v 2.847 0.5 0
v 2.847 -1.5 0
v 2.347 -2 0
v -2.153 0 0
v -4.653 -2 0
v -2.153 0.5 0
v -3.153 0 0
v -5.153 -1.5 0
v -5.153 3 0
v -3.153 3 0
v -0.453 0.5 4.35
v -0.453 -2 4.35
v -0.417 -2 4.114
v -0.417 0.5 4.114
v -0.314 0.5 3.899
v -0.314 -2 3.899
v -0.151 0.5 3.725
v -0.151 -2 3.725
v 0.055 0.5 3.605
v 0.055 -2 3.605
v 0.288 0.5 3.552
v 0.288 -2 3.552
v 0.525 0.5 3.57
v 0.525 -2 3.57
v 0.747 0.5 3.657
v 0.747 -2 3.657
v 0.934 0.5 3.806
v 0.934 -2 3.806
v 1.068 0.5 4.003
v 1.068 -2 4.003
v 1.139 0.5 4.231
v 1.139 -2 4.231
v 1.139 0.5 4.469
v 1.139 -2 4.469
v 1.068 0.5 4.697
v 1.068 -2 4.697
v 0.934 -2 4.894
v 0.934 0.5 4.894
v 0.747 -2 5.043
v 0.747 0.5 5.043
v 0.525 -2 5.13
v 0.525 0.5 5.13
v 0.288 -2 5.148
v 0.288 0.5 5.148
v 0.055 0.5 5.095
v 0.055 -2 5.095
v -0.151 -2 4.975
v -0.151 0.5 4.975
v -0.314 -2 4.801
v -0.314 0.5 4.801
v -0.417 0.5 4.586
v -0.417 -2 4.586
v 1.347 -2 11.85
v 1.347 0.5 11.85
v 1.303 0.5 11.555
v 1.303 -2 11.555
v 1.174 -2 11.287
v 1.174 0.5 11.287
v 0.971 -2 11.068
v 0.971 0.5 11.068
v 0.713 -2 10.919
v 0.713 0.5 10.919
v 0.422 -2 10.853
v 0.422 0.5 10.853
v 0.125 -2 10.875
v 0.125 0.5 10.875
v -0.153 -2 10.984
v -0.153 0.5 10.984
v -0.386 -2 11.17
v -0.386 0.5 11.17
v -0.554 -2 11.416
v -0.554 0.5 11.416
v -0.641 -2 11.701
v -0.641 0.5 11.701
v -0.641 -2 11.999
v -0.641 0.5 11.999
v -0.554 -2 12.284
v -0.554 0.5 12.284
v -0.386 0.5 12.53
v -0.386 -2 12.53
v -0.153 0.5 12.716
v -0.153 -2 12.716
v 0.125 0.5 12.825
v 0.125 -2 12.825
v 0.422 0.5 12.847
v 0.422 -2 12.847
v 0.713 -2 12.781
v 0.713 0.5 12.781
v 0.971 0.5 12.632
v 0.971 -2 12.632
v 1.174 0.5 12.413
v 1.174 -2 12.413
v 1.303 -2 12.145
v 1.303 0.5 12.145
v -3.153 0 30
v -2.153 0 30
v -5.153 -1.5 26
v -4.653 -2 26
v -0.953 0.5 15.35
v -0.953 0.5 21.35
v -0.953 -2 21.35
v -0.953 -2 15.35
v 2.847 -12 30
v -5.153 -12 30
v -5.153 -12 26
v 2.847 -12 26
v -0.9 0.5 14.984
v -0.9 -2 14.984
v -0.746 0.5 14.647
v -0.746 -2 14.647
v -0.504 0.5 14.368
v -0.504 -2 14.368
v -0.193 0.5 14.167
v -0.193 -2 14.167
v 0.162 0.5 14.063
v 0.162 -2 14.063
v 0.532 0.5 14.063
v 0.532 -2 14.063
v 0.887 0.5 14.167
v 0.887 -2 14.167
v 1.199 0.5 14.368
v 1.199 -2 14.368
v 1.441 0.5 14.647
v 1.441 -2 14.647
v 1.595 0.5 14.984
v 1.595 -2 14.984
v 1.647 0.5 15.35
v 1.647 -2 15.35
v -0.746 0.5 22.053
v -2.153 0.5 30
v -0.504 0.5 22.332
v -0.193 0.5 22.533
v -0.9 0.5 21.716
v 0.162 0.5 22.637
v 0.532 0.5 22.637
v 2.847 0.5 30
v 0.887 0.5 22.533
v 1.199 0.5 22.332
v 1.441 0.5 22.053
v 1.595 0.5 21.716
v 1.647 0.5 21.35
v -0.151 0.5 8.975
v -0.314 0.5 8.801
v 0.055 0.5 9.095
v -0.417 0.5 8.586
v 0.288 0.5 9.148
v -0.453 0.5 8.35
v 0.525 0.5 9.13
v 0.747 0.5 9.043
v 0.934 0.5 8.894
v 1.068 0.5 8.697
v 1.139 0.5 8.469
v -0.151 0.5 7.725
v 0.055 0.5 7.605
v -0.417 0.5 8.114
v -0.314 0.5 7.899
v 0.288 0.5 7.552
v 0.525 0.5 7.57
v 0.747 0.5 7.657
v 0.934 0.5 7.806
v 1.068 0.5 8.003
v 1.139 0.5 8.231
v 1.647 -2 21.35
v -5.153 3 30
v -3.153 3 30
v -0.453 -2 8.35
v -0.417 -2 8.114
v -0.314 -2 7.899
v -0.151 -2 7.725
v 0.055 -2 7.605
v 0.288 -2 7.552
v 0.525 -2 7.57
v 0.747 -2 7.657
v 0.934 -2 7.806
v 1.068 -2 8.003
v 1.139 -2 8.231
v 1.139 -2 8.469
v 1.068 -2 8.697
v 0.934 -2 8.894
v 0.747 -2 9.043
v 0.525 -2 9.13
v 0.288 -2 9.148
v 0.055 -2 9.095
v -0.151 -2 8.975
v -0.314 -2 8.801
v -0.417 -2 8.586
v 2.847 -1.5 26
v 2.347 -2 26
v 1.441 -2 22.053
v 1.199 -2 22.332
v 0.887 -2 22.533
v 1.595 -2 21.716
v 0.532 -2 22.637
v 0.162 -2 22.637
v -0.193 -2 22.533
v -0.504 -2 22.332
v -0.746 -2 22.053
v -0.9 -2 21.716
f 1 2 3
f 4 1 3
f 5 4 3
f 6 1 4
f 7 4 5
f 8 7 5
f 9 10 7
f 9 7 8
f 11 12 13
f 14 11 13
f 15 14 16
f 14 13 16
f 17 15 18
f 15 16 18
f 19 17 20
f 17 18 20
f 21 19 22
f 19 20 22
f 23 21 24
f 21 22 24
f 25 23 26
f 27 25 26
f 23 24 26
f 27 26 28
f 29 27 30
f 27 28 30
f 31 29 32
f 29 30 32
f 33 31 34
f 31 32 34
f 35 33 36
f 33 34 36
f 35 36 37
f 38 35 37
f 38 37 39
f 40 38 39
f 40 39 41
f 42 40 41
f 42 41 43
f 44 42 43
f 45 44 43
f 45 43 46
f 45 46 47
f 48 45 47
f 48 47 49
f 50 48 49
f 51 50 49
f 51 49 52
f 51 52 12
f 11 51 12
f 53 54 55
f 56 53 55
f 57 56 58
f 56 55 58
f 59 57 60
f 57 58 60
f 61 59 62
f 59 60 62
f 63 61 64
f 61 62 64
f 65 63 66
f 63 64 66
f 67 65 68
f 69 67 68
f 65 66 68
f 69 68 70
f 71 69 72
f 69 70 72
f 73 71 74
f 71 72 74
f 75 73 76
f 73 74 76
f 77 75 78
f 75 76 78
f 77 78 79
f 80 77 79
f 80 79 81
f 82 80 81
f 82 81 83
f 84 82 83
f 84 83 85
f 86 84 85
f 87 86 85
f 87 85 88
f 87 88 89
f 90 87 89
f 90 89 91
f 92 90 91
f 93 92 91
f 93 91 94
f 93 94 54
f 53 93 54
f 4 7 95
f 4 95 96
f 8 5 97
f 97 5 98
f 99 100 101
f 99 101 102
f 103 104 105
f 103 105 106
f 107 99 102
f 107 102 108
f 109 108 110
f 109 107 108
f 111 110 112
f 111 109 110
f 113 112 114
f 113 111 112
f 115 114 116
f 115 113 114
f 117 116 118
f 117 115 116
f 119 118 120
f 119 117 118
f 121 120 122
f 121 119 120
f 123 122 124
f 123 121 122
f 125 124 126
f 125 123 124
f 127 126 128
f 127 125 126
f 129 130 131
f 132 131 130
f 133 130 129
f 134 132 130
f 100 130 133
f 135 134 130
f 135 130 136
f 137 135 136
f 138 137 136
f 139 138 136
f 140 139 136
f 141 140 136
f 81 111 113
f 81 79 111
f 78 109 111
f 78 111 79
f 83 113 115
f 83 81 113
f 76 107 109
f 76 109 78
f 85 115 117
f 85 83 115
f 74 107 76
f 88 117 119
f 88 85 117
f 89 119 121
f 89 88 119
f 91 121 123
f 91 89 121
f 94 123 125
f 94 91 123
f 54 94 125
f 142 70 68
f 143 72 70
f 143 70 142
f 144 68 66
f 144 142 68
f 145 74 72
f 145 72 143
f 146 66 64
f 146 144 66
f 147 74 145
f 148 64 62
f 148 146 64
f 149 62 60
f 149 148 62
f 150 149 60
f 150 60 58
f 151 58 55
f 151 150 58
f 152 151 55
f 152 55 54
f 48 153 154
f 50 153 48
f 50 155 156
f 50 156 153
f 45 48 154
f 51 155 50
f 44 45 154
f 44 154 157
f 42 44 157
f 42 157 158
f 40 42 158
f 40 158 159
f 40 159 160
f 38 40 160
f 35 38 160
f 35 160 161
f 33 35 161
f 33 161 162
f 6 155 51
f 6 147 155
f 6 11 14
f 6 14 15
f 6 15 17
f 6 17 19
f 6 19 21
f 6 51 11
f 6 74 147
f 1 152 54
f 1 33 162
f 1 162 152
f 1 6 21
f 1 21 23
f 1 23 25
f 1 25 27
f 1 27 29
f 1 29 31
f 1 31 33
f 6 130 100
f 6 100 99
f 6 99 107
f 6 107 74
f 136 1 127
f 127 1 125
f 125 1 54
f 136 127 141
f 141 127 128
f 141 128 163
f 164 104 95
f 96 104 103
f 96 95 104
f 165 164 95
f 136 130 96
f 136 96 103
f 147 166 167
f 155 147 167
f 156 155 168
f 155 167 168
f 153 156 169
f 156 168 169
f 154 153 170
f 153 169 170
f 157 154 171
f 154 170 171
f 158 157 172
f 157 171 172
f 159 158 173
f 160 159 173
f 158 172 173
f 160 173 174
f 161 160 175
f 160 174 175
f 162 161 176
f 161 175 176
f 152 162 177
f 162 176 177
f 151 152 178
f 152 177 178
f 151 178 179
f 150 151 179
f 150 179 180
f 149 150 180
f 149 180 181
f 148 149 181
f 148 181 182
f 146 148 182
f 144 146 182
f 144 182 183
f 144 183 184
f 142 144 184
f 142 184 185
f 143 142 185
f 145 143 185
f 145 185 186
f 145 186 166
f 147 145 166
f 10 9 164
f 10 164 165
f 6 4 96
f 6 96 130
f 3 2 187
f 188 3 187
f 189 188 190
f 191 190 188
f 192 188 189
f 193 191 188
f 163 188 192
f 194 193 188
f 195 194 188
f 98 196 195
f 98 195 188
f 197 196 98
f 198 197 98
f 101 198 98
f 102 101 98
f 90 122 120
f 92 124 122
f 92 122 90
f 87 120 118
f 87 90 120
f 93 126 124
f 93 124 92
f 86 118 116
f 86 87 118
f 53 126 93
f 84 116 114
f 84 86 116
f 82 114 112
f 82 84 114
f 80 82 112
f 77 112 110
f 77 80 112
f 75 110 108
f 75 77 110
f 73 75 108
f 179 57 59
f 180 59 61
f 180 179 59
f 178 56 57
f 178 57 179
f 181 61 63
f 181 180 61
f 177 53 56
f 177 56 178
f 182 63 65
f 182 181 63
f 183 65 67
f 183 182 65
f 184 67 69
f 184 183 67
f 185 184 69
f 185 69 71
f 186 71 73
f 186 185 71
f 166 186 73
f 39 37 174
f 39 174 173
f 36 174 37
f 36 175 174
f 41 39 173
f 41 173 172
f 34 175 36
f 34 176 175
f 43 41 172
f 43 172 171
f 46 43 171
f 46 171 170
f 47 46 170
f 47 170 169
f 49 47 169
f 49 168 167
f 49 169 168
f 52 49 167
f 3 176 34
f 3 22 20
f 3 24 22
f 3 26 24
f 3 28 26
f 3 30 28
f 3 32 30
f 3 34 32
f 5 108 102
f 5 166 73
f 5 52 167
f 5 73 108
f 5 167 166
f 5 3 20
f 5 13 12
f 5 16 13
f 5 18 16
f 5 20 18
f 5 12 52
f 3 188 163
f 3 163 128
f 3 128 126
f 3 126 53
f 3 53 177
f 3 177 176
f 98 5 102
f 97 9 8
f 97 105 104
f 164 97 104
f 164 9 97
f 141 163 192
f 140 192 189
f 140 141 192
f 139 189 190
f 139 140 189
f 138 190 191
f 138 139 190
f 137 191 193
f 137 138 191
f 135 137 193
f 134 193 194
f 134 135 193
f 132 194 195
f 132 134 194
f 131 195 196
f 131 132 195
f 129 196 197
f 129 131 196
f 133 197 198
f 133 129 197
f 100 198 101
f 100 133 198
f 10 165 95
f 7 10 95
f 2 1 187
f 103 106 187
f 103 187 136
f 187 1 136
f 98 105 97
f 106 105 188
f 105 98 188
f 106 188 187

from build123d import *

# Parameters (mm, degrees)
BOSS_EXTRUDE1_DEPTH   = 30
SKETCH3_R             = 1
CUT_EXTRUDE1_DEPTH    = 10
M2_TAPPED_HOLE1_D     = 1.6
M2_TAPPED_HOLE1_DEPTH = 5.2
M2_TAPPED_HOLE1_TIP   = 0.480688495
SKETCH2_W             = 8
SKETCH2_H             = 4
BOSS_EXTRUDE2_DEPTH   = 10
CHAMFER1_SIZE         = 0.5


with BuildPart() as part:
    # Sketch1 → Boss-Extrude1 (new body)
    with BuildSketch(Plane.XY):
        Polygon((-5.152542373, 3), (-3.152542373, 3), (-3.152542373, 0), (-2.152542373, 0), (-2.152542373, 0.5), (2.847457627, 0.5), (2.847457627, -2), (-5.152542373, -2), align=None)
    extrude(amount=BOSS_EXTRUDE1_DEPTH)

    # Sketch3 → Cut-Extrude1 (cut)
    with BuildSketch(Plane(origin=(0, 0.5, 0), x_dir=(1, 0, 0), z_dir=(0, 1, 0))):
        with Locations((0.347457627, -11.85)):
            Circle(SKETCH3_R)
        with BuildLine():
            Line((-0.952542373, -21.35), (-0.952542373, -15.35))
            ThreePointArc((-0.952542373, -15.35), (0.347457627, -14.05), (1.647457627, -15.35))
            Line((1.647457627, -15.35), (1.647457627, -21.35))
            ThreePointArc((1.647457627, -21.35), (0.347457627, -22.65), (-0.952542373, -21.35))
        make_face()
    extrude(amount=-CUT_EXTRUDE1_DEPTH, mode=Mode.SUBTRACT)

    # M2 Tapped Hole1
    with Locations(Plane(origin=(0, 0.5, 0), x_dir=(1, 0, 0), z_dir=(0, 1, 0))):
        with Locations((0.347457627, -4.35), (0.347457627, -8.35)):
            Hole(M2_TAPPED_HOLE1_D / 2, depth=M2_TAPPED_HOLE1_DEPTH)
            with Locations((0, 0, -(M2_TAPPED_HOLE1_DEPTH + M2_TAPPED_HOLE1_TIP / 2))):  # 118° drill point
                Cone(0, M2_TAPPED_HOLE1_D / 2, M2_TAPPED_HOLE1_TIP, mode=Mode.SUBTRACT)

    # Sketch2 → Boss-Extrude2 (add)
    with BuildSketch(Plane.XZ.offset(2)):
        with Locations((-1.152542373, 28)):
            Rectangle(SKETCH2_W, SKETCH2_H)
    extrude(amount=BOSS_EXTRUDE2_DEPTH)

    # Chamfer1
    chamfer1_edges = [part.edges().sort_by_distance(p)[0] for p in [
        (2.847457627, -2, 13),
        (-5.152542373, -2, 13),
    ]]
    chamfer(chamfer1_edges, length=CHAMFER1_SIZE)


solid = part.part
